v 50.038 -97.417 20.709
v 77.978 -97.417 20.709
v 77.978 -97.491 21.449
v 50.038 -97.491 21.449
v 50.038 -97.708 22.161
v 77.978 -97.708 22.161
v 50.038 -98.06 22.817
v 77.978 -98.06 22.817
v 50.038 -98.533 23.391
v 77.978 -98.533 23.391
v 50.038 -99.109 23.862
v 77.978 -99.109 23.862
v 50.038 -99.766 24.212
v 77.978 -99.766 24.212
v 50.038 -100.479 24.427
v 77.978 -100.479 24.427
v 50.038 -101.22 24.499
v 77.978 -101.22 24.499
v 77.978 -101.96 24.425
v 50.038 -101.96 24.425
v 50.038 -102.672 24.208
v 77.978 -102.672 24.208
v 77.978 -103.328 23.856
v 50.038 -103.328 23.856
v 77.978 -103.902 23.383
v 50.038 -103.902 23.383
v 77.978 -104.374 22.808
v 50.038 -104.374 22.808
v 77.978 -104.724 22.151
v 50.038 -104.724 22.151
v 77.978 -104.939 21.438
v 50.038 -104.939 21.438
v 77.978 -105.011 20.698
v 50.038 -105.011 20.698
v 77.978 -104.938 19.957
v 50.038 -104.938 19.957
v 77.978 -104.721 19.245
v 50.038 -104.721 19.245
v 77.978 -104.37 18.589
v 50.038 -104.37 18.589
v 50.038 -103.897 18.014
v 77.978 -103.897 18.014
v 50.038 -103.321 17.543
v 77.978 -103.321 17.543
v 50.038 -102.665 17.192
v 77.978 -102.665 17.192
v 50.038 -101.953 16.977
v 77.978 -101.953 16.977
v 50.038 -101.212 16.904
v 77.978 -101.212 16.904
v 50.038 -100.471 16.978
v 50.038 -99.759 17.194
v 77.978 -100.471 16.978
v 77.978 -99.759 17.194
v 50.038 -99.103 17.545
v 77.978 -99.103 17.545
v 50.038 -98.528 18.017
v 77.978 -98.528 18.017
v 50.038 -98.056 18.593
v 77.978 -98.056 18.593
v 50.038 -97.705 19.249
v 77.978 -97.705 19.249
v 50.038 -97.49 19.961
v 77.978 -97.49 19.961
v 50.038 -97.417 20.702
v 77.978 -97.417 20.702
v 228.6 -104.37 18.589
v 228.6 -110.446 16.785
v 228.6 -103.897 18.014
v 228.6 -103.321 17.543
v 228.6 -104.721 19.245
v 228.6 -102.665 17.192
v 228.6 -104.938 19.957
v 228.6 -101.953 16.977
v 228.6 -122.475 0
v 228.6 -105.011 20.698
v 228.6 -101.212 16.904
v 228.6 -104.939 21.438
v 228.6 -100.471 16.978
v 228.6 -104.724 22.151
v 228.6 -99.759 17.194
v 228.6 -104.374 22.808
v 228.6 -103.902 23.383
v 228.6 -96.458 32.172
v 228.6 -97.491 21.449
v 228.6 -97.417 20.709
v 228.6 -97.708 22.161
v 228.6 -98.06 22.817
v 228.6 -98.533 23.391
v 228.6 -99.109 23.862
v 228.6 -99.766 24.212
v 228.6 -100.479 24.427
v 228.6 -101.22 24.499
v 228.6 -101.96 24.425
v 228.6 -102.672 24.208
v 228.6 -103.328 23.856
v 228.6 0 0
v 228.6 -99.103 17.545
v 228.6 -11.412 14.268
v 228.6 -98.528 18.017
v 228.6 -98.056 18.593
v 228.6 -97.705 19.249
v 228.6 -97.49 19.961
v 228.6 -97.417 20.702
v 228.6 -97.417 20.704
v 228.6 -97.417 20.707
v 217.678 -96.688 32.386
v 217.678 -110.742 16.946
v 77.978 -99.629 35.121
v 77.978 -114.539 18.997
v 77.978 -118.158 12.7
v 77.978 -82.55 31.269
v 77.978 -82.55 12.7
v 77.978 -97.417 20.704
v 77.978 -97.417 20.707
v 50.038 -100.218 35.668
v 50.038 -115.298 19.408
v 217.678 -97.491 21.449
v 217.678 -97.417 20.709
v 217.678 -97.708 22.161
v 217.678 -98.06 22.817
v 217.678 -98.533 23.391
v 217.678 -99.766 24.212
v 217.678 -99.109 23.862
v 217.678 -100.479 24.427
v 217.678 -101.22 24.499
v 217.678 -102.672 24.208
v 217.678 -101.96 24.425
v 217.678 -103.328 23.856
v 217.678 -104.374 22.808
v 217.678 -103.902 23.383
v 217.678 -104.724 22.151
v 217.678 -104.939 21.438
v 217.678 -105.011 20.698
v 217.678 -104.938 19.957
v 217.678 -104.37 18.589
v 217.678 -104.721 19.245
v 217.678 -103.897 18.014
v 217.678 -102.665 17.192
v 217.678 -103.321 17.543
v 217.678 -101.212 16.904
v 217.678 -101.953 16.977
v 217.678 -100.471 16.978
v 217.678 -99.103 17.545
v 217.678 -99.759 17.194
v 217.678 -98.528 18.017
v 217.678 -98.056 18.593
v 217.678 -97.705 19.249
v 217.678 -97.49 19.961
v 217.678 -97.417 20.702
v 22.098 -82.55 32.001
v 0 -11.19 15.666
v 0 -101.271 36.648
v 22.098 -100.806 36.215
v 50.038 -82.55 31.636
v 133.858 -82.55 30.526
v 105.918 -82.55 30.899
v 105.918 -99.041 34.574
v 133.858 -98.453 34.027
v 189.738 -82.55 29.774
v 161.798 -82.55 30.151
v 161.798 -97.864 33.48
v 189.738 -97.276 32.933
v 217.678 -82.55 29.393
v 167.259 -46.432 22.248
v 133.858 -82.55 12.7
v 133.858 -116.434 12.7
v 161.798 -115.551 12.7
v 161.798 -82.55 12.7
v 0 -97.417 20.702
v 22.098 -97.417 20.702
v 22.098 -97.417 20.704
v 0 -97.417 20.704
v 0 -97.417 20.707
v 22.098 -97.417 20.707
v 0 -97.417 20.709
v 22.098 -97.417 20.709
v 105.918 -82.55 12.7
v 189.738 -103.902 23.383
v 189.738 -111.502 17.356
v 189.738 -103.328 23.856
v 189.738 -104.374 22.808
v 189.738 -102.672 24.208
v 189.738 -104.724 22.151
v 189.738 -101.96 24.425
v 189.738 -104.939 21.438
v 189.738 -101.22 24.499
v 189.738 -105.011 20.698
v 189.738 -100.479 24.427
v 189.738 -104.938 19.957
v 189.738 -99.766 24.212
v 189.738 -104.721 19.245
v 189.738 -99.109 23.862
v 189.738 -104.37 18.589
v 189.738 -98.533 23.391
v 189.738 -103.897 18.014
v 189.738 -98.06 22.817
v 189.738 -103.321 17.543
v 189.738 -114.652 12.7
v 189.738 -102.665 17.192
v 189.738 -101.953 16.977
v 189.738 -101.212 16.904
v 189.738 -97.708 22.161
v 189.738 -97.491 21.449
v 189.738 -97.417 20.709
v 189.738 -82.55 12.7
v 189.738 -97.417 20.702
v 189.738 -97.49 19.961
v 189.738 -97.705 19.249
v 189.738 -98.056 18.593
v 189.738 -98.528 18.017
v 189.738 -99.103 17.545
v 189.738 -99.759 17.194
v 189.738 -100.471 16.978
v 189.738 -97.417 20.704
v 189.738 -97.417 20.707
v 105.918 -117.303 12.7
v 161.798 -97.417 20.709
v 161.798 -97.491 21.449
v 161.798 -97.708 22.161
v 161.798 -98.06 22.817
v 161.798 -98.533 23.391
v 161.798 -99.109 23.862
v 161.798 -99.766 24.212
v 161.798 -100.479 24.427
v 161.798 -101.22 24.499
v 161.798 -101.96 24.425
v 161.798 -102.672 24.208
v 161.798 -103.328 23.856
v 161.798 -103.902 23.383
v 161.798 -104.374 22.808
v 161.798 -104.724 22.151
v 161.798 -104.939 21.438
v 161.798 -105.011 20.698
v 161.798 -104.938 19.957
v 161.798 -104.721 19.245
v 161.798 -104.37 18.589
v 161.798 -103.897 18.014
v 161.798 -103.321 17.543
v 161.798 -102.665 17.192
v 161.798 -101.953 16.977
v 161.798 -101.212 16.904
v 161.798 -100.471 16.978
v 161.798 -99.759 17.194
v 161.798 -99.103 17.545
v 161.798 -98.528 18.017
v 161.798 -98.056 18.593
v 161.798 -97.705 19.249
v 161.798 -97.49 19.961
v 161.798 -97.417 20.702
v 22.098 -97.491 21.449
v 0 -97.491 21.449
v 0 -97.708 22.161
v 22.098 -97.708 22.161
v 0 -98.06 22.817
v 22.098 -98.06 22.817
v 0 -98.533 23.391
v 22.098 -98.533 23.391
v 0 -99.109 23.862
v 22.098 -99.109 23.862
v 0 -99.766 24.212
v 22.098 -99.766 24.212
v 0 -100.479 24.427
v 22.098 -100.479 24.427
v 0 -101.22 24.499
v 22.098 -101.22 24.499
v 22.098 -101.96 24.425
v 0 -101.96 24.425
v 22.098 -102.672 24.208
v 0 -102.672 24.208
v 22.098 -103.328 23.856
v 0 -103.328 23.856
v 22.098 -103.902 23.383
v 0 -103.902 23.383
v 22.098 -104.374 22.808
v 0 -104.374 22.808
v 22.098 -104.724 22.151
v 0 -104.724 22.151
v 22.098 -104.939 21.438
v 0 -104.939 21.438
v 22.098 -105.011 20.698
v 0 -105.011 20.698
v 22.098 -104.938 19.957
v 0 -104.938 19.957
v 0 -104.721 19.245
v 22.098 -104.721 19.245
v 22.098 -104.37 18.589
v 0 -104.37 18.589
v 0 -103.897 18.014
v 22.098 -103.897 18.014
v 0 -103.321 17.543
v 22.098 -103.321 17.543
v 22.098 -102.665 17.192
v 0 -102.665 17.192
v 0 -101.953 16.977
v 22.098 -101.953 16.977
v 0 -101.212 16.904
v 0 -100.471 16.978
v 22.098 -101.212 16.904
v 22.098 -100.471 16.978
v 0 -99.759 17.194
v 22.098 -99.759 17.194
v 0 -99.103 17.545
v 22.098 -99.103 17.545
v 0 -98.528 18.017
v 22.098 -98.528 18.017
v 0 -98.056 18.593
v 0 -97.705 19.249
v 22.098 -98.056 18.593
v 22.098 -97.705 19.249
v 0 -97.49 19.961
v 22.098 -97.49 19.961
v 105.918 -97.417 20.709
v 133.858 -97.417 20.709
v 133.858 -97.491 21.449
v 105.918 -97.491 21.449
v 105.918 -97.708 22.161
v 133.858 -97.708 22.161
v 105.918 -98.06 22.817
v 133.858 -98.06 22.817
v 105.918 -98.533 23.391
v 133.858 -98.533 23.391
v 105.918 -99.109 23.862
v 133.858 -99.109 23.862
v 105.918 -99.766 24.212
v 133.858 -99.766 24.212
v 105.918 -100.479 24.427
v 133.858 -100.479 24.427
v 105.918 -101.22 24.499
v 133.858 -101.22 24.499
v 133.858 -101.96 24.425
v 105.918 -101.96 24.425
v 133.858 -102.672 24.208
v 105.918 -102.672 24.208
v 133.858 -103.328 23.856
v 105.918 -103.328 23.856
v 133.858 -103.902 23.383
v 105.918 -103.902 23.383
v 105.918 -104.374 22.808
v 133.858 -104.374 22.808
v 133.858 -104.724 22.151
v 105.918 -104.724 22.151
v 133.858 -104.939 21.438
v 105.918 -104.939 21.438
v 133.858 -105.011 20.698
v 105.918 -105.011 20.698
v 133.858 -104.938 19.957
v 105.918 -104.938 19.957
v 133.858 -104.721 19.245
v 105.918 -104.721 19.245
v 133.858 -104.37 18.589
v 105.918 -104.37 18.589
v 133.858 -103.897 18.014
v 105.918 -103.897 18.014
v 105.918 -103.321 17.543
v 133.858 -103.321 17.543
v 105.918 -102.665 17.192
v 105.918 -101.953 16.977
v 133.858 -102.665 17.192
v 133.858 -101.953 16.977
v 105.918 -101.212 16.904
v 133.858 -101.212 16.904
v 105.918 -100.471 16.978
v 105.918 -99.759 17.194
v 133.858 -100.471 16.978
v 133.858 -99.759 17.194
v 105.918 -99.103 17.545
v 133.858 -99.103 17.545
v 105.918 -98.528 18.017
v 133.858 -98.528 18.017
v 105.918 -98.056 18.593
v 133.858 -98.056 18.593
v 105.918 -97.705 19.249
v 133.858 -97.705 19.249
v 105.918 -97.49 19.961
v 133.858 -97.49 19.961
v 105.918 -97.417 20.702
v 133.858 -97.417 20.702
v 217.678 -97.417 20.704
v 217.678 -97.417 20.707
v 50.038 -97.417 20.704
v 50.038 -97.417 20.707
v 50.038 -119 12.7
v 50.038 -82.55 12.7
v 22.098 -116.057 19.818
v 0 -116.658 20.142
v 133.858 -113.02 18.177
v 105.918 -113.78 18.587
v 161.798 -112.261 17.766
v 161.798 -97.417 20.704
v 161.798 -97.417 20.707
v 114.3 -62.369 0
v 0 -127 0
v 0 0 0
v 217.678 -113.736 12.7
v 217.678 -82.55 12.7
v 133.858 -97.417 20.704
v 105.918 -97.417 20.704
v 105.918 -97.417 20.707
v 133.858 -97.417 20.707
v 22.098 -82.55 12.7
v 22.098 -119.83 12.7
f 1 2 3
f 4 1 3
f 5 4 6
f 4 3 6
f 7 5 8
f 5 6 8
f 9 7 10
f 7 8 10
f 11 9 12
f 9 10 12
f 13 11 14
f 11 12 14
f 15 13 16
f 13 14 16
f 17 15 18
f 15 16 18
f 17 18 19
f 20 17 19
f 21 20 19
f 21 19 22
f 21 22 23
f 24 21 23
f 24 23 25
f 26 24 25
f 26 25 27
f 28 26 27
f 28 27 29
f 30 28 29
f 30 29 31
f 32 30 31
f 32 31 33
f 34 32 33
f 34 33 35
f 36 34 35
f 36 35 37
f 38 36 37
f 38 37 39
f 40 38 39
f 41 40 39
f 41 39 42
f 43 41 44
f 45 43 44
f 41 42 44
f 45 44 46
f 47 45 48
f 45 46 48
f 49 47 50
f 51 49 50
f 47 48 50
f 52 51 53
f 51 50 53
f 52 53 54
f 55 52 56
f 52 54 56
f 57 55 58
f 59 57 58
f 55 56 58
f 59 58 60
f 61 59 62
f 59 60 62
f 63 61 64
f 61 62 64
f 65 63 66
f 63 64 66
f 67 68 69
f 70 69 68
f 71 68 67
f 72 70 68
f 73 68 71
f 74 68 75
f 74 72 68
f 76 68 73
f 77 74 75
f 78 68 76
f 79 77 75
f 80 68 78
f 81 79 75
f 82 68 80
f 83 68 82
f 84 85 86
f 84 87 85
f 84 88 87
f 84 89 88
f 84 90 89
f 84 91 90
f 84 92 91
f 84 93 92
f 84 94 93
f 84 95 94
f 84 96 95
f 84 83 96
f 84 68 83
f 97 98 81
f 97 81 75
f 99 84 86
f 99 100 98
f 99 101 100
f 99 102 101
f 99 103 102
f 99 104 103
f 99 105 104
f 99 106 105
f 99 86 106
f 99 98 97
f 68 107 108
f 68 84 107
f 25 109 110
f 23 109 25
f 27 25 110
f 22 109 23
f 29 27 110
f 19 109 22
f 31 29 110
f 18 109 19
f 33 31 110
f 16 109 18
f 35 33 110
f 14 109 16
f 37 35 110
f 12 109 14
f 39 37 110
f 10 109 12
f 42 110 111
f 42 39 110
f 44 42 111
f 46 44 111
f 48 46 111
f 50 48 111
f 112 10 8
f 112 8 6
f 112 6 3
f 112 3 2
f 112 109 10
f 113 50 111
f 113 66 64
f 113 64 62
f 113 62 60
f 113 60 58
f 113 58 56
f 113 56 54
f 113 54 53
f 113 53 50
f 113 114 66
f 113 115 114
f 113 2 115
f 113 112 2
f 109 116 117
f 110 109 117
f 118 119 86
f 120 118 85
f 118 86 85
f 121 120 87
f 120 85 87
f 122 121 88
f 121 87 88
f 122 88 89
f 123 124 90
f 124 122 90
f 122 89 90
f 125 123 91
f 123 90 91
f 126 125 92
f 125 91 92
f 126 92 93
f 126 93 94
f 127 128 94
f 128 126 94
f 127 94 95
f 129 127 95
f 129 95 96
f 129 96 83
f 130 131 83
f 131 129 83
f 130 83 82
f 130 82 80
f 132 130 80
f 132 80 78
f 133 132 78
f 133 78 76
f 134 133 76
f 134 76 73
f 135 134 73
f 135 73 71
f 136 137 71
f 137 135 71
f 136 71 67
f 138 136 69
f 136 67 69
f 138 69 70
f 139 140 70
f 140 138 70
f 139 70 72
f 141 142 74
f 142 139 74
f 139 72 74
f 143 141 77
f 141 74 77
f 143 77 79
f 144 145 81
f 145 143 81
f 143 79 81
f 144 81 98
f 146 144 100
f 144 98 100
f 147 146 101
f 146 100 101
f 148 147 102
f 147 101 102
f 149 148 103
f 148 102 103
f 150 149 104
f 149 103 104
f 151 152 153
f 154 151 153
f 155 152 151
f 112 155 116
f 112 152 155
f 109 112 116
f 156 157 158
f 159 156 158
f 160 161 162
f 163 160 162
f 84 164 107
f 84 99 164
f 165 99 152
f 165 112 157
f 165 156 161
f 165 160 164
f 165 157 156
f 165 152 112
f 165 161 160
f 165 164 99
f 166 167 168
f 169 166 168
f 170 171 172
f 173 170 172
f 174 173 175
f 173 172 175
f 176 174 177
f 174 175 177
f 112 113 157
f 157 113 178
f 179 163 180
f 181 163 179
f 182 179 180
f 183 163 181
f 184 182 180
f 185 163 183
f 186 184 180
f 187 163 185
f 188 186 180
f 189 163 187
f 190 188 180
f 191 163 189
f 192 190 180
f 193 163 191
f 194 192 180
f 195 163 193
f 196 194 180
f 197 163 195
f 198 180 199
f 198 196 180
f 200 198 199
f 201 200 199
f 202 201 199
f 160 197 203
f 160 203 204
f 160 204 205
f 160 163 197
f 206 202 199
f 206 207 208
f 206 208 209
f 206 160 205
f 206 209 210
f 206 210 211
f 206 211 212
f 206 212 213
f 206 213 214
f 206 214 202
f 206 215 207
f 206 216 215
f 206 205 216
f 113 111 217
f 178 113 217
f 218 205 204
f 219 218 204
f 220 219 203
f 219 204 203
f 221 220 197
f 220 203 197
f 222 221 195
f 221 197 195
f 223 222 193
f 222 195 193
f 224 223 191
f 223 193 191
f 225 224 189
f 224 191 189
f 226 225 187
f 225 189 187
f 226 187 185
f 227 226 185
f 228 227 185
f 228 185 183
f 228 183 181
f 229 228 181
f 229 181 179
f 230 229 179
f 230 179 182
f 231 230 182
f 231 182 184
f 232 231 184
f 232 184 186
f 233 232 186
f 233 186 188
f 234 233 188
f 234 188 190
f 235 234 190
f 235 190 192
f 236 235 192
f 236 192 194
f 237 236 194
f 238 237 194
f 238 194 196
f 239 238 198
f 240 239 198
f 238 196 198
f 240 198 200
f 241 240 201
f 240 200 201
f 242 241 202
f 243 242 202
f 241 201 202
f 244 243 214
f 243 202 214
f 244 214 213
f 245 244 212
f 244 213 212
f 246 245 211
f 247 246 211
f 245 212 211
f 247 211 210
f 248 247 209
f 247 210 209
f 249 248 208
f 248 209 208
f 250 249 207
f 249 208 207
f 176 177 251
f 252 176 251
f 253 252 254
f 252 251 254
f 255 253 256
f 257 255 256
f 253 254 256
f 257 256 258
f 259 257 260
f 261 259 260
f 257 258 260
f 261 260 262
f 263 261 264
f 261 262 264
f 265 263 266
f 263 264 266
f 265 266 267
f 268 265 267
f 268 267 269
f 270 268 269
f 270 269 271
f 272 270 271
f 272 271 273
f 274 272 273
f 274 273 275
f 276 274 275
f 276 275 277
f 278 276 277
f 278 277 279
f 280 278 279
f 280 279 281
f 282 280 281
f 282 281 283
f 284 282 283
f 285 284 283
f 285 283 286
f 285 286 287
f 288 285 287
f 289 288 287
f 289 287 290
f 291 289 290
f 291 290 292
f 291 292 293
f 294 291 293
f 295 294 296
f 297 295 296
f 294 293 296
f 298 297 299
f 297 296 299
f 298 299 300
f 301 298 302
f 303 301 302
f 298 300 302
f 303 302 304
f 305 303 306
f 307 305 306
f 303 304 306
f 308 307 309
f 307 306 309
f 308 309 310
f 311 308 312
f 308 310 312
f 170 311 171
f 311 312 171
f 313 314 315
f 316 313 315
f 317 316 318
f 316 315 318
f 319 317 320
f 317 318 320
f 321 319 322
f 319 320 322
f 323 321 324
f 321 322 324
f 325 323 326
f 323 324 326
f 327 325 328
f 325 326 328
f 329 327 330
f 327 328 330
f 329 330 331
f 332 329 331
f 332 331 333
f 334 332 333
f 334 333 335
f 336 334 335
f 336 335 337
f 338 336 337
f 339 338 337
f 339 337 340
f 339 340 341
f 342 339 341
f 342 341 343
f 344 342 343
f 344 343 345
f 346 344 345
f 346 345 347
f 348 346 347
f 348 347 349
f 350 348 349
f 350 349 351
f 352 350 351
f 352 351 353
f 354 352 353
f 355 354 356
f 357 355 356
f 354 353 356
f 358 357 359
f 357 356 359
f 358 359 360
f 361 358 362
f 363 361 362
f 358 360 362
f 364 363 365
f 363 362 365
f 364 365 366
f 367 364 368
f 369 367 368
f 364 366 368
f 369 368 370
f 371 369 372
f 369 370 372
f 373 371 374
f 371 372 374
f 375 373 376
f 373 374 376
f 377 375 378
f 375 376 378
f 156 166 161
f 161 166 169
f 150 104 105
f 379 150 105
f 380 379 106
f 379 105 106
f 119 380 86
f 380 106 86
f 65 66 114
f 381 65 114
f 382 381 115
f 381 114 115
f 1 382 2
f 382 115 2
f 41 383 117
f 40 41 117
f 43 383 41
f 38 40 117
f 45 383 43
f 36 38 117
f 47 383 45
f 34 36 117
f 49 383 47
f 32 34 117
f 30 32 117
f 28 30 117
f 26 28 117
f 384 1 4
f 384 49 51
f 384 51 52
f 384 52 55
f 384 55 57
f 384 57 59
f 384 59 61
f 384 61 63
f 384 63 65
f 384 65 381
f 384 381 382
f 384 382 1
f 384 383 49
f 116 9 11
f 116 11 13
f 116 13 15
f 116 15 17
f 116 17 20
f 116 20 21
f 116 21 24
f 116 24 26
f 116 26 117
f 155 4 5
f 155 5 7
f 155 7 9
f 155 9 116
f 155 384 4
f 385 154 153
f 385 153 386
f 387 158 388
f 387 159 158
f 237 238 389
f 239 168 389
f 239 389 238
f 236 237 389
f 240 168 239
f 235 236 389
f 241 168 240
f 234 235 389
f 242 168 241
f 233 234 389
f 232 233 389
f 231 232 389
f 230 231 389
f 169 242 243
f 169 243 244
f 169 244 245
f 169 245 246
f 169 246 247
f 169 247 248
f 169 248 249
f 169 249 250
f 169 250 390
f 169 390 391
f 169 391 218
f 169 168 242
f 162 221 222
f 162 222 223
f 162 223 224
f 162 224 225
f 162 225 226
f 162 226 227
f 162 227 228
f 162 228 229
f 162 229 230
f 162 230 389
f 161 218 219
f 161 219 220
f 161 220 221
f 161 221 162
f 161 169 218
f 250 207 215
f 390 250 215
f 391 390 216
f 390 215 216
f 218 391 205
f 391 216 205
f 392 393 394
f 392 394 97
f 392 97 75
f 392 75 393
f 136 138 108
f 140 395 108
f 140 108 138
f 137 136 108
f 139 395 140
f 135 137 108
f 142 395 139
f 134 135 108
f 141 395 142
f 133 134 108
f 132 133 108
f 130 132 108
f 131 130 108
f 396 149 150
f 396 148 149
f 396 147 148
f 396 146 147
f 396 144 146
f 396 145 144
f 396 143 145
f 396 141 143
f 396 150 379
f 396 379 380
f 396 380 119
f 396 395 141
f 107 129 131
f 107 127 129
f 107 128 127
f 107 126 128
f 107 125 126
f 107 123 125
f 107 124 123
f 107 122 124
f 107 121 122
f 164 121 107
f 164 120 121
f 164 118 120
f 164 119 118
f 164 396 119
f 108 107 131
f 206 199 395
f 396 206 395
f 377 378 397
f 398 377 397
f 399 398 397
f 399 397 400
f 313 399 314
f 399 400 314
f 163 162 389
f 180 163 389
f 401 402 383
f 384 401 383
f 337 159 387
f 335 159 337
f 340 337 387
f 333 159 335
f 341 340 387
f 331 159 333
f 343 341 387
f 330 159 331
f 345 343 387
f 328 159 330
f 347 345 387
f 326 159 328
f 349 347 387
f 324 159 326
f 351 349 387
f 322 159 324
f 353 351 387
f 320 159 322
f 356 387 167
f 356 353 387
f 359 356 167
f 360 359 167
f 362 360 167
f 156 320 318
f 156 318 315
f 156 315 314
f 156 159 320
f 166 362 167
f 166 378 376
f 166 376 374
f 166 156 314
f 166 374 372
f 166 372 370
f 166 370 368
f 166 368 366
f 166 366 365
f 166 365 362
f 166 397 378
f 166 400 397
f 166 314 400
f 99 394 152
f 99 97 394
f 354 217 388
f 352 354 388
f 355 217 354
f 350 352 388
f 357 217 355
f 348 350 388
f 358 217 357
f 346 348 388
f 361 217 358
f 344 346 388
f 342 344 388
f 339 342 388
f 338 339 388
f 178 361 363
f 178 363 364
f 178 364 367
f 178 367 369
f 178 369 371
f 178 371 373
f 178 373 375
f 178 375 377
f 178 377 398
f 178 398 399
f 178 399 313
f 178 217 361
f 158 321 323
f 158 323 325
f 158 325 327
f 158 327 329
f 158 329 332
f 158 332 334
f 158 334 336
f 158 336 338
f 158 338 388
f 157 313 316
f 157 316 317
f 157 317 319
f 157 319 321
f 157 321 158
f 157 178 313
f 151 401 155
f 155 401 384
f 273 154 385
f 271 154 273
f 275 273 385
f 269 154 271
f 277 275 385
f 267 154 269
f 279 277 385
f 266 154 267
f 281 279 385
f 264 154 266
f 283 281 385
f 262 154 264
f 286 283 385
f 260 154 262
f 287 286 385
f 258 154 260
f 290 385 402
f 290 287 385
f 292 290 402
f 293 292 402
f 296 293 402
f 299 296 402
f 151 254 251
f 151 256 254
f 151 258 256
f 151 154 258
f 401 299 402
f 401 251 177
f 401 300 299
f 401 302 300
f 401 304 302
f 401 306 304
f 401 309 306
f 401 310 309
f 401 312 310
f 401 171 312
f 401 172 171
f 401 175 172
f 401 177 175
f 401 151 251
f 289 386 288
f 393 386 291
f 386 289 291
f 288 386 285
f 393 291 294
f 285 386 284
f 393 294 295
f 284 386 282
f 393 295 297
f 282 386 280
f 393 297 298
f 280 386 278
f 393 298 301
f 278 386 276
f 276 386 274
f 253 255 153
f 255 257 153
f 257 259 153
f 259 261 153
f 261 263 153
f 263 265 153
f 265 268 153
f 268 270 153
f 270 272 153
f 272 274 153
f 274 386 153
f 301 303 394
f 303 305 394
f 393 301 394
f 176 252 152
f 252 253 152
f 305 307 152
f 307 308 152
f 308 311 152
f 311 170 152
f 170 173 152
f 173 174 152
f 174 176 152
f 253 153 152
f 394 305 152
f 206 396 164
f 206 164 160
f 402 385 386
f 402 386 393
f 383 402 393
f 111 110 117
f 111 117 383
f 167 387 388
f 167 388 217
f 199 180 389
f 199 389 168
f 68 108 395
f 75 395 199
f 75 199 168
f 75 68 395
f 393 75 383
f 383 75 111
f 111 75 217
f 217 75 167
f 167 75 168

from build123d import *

# Parameters (mm, degrees)
F5_DEPTH  = 228.6
F7_W      = 27.94
F7_H      = 27.94
F8_DEPTH  = 25.4
F13_DEPTH = 609.6
F15_W     = 27.94
F15_H     = 27.94
F16_DEPTH = 25.4
F21_DEPTH = 50.8


with BuildPart() as f3:
    # F0 (on Right) → F3 section 0
    with BuildSketch(Plane.YZ):
        Polygon((-127, 0), (0, 0), (-11.19021, 15.666293), (-101.271398, 36.647938), (-116.657943, 20.142378), align=None)
    # F2 (on offset) → F3 section 1
    with BuildSketch(Plane.YZ.offset(228.6)):
        Polygon((-122.475073, 0), (0, 0), (-11.412238, 14.267517), (-96.457832, 32.171853), (-110.445596, 16.785316), align=None)
    loft()

    # F4 (on offset) → F5 (cut)
    with BuildSketch(Plane.YZ.offset(228.6)):
        with BuildLine():
            ThreePointArc((-97.416677, 20.708883), (-105.011268, 20.69831), (-97.41667, 20.701834))
            ThreePointArc((-97.41667, 20.701834), (-97.416672, 20.705359), (-97.416677, 20.708883))
        make_face()
    extrude(amount=-F5_DEPTH, mode=Mode.SUBTRACT)

    # F7 (on offset) → F8 (cut)
    with BuildSketch(Plane.XY.offset(16.9164)):
        with Locations((36.068, -96.52)):
            Rectangle(F7_W, F7_H)
        with Locations((91.948, -96.52)):
            Rectangle(F7_W, F7_H)
        with Locations((147.828, -96.52)):
            Rectangle(F7_W, F7_H)
        Polygon((203.708, -82.55), (189.738, -82.55), (189.738, -110.49), (217.678, -110.49), (217.678, -82.55), align=None)
    extrude(amount=F8_DEPTH, mode=Mode.SUBTRACT)

    # F9 (on face) + F10 (on face) + F11 (on face) + F12 (on face) → F13 (cut)
    with BuildSketch(Plane.XZ.offset(82.55)):
        Polygon((50.038, 31.635782), (22.098, 32.000567), (22.098, 16.9164), (50.038, 16.9164), align=None)
    with BuildSketch(Plane.XZ.offset(82.55)):
        Polygon((105.918, 30.898753), (77.978, 31.268528), (77.978, 16.9164), (105.918, 16.9164), align=None)
    with BuildSketch(Plane.XZ.offset(82.55)):
        Polygon((161.798, 30.151425), (133.858, 30.526404), (133.858, 16.9164), (161.798, 16.9164), align=None)
    with BuildSketch(Plane.XZ.offset(82.55)):
        Polygon((217.678, 29.393352), (189.738, 29.773761), (189.738, 16.9164), (217.678, 16.9164), align=None)
    extrude(amount=F13_DEPTH, mode=Mode.SUBTRACT)

    # F15 (on offset) → F16 (cut)
    with BuildSketch(Plane.XY.offset(12.7)):
        with Locations((36.068, -96.52)):
            Rectangle(F15_W, F15_H)
        with Locations((91.948, -96.52)):
            Rectangle(F15_W, F15_H)
        with Locations((147.828, -96.52)):
            Rectangle(F15_W, F15_H)
        with Locations((203.708, -96.52)):
            Rectangle(F15_W, F15_H)
    extrude(amount=F16_DEPTH, mode=Mode.SUBTRACT)

    # F17 (on face) + F18 (on face) + F19 (on face) + F20 (on face) → F21 (cut)
    with BuildSketch(Plane.XZ.offset(82.55)):
        Polygon((50.038, 31.635782), (22.098, 32.000567), (22.098, 12.7), (50.038, 12.7), align=None)
    with BuildSketch(Plane.XZ.offset(82.55)):
        Polygon((105.918, 30.898753), (77.978, 31.268528), (77.978, 12.7), (105.918, 12.7), align=None)
    with BuildSketch(Plane.XZ.offset(82.55)):
        Polygon((161.798, 30.151425), (133.858, 30.526404), (133.858, 12.7), (161.798, 12.7), align=None)
    with BuildSketch(Plane.XZ.offset(82.55)):
        Polygon((217.678, 29.393352), (189.738, 29.773761), (189.738, 12.7), (217.678, 12.7), align=None)
    extrude(amount=F21_DEPTH, mode=Mode.SUBTRACT)


solid = f3.part
